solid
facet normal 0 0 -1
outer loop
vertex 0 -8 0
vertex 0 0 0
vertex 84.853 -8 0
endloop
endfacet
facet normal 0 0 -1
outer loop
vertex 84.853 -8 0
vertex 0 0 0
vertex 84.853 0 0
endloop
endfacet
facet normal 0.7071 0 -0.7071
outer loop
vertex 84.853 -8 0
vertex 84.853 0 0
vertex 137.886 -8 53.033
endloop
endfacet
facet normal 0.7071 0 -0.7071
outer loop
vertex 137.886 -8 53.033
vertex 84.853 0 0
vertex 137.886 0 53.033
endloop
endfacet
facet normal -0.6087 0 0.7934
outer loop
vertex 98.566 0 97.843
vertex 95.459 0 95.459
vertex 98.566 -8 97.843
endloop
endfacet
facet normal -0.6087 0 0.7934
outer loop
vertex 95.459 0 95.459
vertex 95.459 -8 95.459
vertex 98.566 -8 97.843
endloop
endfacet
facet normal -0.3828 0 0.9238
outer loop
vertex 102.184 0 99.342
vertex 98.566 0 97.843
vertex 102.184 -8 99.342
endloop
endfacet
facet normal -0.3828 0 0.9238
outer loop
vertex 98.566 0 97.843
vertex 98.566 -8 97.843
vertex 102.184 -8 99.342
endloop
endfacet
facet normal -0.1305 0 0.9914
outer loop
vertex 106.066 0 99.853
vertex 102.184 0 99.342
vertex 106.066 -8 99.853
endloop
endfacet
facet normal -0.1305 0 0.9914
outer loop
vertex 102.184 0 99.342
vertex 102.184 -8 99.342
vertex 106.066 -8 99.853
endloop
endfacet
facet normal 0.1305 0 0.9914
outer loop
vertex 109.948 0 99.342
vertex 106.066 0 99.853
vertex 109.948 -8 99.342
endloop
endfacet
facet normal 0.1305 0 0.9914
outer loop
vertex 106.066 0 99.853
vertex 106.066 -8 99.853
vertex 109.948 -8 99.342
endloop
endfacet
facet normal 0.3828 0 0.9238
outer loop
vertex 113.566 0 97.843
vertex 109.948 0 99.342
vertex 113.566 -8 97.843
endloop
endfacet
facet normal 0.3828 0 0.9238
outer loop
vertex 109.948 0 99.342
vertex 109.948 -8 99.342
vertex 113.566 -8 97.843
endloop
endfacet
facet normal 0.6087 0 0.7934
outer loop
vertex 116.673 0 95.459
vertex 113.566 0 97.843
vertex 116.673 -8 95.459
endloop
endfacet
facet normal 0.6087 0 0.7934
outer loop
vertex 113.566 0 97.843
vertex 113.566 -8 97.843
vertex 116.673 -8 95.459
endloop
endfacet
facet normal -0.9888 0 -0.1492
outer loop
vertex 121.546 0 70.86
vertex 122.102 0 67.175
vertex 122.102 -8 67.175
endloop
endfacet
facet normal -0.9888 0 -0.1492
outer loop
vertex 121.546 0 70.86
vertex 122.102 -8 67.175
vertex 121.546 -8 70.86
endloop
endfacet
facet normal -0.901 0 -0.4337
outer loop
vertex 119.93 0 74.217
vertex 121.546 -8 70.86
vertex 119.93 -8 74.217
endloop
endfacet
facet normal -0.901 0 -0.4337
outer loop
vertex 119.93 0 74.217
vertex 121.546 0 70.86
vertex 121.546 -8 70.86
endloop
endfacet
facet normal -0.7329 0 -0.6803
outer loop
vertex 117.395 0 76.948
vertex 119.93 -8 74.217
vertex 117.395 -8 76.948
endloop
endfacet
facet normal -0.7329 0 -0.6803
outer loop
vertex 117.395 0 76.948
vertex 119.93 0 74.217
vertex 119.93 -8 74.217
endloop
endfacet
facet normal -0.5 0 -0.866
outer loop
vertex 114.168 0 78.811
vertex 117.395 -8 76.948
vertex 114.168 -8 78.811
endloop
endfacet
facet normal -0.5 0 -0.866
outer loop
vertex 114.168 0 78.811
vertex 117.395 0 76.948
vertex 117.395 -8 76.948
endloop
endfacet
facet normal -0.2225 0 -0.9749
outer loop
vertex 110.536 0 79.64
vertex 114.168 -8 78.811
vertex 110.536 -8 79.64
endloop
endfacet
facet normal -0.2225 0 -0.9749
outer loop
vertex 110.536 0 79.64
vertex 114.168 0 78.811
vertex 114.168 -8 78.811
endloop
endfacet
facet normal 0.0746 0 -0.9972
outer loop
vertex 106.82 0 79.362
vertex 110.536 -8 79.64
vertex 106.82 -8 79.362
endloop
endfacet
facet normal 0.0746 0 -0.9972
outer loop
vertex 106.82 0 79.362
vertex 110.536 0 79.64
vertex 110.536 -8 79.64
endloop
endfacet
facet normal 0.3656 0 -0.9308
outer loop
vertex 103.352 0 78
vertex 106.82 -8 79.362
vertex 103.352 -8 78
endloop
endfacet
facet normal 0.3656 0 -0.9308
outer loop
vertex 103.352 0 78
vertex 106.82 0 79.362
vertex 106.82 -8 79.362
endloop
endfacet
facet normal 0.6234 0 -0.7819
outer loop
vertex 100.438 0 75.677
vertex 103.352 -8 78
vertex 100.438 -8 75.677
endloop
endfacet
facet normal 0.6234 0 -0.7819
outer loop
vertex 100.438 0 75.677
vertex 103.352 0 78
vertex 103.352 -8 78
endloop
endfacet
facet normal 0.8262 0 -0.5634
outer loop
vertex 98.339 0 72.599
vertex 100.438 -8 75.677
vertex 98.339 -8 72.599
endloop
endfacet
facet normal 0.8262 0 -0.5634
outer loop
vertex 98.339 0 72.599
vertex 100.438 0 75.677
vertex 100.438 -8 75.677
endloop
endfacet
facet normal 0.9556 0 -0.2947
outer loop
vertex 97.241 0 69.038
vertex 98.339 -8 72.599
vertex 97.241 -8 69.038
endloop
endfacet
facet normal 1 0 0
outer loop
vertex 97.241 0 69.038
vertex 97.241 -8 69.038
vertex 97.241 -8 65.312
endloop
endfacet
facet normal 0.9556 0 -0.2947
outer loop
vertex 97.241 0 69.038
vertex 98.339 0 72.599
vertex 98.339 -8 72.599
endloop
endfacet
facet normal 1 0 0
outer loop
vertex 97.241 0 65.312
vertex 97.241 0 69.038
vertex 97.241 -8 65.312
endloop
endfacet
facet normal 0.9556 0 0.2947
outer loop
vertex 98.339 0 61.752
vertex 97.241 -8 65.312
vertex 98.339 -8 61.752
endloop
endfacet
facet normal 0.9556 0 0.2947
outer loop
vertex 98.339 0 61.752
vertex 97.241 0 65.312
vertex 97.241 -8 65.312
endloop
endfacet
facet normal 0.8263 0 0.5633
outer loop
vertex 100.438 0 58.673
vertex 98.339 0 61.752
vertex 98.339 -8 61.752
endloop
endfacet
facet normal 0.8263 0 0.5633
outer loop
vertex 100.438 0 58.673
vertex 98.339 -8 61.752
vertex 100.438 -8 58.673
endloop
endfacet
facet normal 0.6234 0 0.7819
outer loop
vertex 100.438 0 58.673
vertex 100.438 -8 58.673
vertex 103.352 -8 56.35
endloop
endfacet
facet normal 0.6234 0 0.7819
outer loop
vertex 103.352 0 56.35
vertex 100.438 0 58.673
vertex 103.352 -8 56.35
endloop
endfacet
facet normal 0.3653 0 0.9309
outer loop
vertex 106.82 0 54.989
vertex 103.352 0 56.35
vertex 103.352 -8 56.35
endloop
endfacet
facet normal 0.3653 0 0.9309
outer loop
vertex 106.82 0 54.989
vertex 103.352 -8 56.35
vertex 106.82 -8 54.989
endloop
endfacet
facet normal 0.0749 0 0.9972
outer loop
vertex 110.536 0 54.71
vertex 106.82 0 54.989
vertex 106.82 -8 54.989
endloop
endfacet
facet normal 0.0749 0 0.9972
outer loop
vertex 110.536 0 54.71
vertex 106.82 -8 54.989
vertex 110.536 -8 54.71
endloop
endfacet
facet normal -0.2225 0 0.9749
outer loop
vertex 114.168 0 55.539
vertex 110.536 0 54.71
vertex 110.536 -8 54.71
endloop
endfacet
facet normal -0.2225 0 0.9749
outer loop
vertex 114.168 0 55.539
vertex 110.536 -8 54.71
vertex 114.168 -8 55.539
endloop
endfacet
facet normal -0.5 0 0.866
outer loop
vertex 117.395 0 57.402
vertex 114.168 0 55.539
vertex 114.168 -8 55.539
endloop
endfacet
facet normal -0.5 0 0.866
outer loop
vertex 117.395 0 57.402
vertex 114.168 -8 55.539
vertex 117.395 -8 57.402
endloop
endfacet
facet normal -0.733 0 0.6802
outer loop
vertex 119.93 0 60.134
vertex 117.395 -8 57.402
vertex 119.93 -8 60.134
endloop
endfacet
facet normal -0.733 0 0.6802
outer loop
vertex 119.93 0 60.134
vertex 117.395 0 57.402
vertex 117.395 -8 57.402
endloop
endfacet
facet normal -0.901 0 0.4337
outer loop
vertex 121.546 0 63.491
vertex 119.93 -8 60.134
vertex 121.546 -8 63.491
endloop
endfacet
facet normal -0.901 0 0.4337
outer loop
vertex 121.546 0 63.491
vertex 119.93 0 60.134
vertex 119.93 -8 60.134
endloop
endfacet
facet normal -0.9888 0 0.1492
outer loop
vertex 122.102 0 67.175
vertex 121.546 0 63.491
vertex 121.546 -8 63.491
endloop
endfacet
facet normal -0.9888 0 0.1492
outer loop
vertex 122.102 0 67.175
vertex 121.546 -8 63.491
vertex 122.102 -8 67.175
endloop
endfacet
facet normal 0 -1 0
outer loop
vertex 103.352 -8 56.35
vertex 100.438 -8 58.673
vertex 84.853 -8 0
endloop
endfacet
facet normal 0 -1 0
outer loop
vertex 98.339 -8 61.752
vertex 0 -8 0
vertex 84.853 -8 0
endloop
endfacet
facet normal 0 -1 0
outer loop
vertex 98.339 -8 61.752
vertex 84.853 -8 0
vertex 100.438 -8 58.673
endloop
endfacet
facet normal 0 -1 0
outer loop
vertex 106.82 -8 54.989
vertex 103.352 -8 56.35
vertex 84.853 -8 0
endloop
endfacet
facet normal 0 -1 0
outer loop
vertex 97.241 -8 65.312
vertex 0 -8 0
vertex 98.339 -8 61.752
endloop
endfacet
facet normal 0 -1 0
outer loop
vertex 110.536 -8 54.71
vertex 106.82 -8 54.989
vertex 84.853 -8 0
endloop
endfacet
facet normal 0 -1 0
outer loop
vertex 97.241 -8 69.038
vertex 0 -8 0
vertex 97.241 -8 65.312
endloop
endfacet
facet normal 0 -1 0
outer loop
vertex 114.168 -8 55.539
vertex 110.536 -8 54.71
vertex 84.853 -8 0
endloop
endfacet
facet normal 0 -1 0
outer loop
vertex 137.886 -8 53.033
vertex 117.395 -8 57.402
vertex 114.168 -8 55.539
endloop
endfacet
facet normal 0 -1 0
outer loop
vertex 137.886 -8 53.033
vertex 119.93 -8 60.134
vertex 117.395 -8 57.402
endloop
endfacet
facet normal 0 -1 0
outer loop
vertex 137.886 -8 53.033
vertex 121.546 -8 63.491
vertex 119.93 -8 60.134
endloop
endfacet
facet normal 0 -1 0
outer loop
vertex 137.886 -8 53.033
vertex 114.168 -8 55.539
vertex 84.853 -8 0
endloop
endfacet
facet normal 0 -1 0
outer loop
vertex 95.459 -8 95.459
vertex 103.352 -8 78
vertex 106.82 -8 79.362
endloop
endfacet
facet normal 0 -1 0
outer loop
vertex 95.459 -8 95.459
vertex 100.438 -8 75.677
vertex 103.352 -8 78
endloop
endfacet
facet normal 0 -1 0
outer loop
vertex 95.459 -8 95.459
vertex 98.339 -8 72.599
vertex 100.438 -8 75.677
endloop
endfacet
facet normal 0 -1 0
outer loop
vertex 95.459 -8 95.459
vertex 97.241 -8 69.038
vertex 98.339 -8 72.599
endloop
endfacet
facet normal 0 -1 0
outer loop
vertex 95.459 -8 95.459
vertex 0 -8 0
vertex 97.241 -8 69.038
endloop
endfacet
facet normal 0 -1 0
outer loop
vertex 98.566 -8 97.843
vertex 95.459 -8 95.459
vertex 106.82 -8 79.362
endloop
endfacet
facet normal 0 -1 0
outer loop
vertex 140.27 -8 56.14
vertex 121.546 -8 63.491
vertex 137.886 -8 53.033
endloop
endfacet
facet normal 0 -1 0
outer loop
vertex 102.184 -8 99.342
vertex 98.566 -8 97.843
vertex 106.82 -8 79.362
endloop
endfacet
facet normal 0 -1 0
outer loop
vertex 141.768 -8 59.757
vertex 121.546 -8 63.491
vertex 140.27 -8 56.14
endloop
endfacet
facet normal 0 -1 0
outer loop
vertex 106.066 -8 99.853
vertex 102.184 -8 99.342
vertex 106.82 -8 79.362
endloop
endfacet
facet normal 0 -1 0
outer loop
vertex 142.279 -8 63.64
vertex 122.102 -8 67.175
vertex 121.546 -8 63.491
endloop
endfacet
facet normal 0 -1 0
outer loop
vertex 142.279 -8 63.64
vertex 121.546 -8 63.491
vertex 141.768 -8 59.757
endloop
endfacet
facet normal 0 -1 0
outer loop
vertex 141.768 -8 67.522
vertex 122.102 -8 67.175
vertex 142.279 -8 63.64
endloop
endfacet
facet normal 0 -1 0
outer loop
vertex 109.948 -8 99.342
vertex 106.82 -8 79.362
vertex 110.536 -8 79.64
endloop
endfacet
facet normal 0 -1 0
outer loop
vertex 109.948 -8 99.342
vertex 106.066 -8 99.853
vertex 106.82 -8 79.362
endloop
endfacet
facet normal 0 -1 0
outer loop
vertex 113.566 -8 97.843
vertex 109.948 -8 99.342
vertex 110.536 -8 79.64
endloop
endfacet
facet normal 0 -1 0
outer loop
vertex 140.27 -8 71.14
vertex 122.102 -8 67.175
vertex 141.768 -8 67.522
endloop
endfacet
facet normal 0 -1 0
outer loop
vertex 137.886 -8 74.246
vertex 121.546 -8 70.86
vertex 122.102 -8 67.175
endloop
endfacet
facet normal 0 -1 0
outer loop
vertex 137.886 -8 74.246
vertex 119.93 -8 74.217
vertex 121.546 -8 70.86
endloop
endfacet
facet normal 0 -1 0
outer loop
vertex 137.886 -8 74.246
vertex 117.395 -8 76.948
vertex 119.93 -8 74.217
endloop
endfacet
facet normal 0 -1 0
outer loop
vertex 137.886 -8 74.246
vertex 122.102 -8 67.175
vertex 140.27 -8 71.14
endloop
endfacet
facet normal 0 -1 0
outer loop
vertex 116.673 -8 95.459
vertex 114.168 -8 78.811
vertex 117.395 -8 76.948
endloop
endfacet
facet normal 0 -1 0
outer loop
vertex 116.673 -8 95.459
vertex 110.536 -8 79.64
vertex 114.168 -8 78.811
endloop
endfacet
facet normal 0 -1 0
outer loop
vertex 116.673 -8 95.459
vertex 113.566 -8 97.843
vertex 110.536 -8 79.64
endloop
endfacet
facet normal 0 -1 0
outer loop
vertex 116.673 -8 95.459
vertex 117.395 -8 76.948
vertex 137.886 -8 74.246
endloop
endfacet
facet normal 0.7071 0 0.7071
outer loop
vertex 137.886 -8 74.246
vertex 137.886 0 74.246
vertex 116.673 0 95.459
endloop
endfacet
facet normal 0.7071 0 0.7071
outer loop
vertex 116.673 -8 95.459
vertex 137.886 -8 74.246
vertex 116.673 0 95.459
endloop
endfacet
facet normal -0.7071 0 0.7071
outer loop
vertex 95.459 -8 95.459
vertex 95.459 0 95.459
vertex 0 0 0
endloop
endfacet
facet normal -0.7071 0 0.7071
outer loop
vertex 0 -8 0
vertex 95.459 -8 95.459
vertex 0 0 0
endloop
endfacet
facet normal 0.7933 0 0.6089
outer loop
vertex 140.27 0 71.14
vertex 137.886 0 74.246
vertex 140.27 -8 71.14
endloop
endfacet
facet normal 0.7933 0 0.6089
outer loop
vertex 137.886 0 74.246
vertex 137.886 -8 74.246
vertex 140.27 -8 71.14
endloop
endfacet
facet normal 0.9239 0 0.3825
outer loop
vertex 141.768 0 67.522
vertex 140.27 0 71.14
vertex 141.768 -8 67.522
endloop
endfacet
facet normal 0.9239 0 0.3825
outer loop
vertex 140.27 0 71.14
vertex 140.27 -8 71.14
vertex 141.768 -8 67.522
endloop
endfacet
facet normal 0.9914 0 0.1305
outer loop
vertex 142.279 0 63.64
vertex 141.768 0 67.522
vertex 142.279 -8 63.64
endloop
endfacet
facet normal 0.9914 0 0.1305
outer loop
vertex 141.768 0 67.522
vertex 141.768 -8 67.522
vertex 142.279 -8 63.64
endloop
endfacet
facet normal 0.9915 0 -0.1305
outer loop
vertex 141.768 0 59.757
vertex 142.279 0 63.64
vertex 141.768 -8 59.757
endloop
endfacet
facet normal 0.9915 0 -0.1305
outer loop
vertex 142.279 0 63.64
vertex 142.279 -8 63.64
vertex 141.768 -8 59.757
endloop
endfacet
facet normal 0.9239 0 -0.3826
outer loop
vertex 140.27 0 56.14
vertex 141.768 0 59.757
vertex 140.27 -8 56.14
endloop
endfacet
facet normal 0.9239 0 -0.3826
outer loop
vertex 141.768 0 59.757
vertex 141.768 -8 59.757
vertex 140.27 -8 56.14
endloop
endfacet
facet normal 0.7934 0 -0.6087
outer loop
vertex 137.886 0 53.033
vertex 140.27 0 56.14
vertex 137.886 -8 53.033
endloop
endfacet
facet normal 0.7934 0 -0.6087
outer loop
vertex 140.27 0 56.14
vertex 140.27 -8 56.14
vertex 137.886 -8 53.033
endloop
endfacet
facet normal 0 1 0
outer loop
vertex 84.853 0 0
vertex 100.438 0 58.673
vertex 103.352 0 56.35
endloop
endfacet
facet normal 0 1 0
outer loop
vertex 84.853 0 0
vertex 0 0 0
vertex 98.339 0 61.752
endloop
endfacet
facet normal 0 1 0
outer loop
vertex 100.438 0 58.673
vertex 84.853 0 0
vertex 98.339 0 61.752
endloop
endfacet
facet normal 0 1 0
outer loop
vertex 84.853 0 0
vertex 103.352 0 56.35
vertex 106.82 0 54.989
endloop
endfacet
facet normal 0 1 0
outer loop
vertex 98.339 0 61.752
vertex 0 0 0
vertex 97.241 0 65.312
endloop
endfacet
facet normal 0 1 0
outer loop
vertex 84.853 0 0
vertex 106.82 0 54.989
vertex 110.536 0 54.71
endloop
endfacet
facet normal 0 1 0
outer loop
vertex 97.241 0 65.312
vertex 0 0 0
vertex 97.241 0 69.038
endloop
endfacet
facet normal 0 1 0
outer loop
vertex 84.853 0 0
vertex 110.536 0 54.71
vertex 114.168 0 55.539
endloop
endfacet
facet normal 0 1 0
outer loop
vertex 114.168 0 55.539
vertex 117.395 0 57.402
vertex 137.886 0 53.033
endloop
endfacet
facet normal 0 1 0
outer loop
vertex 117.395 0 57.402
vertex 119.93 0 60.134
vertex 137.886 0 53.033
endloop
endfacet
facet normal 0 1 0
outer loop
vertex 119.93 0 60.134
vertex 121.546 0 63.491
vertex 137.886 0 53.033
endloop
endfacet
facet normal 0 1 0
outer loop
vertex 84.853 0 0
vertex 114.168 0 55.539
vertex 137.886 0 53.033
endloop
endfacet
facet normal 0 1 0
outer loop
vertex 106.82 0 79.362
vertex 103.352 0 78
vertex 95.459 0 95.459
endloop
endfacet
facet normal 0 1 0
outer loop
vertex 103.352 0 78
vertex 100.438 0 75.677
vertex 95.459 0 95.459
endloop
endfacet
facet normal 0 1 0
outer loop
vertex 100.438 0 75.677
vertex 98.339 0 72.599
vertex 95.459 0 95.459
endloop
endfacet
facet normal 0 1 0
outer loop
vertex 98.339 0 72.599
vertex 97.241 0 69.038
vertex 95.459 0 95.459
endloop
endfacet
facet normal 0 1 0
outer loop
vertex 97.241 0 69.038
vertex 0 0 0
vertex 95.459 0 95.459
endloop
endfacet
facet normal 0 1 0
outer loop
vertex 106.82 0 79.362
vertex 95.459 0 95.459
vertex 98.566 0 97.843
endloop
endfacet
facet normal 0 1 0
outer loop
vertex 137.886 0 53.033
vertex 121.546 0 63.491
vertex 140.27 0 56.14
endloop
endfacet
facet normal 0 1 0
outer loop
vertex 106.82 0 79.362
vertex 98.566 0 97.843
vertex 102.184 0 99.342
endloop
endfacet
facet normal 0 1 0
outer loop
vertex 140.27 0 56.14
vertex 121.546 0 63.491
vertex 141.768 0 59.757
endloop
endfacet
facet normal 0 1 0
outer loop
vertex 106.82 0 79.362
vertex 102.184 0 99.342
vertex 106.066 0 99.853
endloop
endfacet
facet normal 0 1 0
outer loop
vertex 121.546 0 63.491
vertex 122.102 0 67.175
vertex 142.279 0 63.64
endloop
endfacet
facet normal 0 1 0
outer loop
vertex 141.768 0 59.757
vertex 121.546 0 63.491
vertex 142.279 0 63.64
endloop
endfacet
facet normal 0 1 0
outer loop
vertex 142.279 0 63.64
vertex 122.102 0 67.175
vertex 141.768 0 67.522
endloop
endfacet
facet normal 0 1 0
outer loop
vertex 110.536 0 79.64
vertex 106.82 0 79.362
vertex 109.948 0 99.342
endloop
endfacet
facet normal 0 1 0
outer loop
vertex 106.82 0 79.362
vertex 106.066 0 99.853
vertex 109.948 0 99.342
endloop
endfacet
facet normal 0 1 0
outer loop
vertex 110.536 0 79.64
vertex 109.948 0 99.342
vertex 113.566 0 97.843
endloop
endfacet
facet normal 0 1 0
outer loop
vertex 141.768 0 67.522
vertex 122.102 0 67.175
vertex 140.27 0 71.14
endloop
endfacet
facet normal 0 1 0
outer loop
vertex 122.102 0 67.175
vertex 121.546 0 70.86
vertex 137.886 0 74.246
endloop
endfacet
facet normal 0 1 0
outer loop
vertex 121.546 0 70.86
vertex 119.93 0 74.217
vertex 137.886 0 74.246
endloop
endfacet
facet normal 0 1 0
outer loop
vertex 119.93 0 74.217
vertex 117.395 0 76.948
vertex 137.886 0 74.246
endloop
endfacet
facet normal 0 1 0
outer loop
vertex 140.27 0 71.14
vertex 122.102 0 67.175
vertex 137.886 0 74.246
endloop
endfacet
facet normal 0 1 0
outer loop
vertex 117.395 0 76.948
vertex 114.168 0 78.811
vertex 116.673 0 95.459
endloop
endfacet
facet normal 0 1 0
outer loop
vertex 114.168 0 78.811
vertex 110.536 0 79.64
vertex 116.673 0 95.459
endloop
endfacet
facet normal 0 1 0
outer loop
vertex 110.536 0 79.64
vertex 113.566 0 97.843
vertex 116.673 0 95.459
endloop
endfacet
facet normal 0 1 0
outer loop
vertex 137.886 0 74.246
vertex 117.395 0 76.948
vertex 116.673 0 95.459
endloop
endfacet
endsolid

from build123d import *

# Parameters (mm, degrees)
F0_R     = 12.5
F1_DEPTH = 8
F2_R     = 15
F3_R     = 15


with BuildPart() as f1:
    # F0 (on Front) → F1 (new body)
    with BuildSketch(Plane.XZ):
        Polygon((106.066017, 106.066017), (0, 0), (84.852814, 0), (148.492424, 63.63961), align=None)
        with Locations((109.601551, 67.175144)):
            Circle(F0_R, mode=Mode.SUBTRACT)
    extrude(amount=F1_DEPTH)

    # F2
    f2_edges = [f1.edges().sort_by_distance(p)[0] for p in [
        (106.066017, -4, 106.066017),
    ]]
    fillet(f2_edges, radius=F2_R)

    # F3
    f3_edges = [f1.edges().sort_by_distance(p)[0] for p in [
        (148.492424, -4, 63.63961),
    ]]
    fillet(f3_edges, radius=F3_R)


solid = f1.part
